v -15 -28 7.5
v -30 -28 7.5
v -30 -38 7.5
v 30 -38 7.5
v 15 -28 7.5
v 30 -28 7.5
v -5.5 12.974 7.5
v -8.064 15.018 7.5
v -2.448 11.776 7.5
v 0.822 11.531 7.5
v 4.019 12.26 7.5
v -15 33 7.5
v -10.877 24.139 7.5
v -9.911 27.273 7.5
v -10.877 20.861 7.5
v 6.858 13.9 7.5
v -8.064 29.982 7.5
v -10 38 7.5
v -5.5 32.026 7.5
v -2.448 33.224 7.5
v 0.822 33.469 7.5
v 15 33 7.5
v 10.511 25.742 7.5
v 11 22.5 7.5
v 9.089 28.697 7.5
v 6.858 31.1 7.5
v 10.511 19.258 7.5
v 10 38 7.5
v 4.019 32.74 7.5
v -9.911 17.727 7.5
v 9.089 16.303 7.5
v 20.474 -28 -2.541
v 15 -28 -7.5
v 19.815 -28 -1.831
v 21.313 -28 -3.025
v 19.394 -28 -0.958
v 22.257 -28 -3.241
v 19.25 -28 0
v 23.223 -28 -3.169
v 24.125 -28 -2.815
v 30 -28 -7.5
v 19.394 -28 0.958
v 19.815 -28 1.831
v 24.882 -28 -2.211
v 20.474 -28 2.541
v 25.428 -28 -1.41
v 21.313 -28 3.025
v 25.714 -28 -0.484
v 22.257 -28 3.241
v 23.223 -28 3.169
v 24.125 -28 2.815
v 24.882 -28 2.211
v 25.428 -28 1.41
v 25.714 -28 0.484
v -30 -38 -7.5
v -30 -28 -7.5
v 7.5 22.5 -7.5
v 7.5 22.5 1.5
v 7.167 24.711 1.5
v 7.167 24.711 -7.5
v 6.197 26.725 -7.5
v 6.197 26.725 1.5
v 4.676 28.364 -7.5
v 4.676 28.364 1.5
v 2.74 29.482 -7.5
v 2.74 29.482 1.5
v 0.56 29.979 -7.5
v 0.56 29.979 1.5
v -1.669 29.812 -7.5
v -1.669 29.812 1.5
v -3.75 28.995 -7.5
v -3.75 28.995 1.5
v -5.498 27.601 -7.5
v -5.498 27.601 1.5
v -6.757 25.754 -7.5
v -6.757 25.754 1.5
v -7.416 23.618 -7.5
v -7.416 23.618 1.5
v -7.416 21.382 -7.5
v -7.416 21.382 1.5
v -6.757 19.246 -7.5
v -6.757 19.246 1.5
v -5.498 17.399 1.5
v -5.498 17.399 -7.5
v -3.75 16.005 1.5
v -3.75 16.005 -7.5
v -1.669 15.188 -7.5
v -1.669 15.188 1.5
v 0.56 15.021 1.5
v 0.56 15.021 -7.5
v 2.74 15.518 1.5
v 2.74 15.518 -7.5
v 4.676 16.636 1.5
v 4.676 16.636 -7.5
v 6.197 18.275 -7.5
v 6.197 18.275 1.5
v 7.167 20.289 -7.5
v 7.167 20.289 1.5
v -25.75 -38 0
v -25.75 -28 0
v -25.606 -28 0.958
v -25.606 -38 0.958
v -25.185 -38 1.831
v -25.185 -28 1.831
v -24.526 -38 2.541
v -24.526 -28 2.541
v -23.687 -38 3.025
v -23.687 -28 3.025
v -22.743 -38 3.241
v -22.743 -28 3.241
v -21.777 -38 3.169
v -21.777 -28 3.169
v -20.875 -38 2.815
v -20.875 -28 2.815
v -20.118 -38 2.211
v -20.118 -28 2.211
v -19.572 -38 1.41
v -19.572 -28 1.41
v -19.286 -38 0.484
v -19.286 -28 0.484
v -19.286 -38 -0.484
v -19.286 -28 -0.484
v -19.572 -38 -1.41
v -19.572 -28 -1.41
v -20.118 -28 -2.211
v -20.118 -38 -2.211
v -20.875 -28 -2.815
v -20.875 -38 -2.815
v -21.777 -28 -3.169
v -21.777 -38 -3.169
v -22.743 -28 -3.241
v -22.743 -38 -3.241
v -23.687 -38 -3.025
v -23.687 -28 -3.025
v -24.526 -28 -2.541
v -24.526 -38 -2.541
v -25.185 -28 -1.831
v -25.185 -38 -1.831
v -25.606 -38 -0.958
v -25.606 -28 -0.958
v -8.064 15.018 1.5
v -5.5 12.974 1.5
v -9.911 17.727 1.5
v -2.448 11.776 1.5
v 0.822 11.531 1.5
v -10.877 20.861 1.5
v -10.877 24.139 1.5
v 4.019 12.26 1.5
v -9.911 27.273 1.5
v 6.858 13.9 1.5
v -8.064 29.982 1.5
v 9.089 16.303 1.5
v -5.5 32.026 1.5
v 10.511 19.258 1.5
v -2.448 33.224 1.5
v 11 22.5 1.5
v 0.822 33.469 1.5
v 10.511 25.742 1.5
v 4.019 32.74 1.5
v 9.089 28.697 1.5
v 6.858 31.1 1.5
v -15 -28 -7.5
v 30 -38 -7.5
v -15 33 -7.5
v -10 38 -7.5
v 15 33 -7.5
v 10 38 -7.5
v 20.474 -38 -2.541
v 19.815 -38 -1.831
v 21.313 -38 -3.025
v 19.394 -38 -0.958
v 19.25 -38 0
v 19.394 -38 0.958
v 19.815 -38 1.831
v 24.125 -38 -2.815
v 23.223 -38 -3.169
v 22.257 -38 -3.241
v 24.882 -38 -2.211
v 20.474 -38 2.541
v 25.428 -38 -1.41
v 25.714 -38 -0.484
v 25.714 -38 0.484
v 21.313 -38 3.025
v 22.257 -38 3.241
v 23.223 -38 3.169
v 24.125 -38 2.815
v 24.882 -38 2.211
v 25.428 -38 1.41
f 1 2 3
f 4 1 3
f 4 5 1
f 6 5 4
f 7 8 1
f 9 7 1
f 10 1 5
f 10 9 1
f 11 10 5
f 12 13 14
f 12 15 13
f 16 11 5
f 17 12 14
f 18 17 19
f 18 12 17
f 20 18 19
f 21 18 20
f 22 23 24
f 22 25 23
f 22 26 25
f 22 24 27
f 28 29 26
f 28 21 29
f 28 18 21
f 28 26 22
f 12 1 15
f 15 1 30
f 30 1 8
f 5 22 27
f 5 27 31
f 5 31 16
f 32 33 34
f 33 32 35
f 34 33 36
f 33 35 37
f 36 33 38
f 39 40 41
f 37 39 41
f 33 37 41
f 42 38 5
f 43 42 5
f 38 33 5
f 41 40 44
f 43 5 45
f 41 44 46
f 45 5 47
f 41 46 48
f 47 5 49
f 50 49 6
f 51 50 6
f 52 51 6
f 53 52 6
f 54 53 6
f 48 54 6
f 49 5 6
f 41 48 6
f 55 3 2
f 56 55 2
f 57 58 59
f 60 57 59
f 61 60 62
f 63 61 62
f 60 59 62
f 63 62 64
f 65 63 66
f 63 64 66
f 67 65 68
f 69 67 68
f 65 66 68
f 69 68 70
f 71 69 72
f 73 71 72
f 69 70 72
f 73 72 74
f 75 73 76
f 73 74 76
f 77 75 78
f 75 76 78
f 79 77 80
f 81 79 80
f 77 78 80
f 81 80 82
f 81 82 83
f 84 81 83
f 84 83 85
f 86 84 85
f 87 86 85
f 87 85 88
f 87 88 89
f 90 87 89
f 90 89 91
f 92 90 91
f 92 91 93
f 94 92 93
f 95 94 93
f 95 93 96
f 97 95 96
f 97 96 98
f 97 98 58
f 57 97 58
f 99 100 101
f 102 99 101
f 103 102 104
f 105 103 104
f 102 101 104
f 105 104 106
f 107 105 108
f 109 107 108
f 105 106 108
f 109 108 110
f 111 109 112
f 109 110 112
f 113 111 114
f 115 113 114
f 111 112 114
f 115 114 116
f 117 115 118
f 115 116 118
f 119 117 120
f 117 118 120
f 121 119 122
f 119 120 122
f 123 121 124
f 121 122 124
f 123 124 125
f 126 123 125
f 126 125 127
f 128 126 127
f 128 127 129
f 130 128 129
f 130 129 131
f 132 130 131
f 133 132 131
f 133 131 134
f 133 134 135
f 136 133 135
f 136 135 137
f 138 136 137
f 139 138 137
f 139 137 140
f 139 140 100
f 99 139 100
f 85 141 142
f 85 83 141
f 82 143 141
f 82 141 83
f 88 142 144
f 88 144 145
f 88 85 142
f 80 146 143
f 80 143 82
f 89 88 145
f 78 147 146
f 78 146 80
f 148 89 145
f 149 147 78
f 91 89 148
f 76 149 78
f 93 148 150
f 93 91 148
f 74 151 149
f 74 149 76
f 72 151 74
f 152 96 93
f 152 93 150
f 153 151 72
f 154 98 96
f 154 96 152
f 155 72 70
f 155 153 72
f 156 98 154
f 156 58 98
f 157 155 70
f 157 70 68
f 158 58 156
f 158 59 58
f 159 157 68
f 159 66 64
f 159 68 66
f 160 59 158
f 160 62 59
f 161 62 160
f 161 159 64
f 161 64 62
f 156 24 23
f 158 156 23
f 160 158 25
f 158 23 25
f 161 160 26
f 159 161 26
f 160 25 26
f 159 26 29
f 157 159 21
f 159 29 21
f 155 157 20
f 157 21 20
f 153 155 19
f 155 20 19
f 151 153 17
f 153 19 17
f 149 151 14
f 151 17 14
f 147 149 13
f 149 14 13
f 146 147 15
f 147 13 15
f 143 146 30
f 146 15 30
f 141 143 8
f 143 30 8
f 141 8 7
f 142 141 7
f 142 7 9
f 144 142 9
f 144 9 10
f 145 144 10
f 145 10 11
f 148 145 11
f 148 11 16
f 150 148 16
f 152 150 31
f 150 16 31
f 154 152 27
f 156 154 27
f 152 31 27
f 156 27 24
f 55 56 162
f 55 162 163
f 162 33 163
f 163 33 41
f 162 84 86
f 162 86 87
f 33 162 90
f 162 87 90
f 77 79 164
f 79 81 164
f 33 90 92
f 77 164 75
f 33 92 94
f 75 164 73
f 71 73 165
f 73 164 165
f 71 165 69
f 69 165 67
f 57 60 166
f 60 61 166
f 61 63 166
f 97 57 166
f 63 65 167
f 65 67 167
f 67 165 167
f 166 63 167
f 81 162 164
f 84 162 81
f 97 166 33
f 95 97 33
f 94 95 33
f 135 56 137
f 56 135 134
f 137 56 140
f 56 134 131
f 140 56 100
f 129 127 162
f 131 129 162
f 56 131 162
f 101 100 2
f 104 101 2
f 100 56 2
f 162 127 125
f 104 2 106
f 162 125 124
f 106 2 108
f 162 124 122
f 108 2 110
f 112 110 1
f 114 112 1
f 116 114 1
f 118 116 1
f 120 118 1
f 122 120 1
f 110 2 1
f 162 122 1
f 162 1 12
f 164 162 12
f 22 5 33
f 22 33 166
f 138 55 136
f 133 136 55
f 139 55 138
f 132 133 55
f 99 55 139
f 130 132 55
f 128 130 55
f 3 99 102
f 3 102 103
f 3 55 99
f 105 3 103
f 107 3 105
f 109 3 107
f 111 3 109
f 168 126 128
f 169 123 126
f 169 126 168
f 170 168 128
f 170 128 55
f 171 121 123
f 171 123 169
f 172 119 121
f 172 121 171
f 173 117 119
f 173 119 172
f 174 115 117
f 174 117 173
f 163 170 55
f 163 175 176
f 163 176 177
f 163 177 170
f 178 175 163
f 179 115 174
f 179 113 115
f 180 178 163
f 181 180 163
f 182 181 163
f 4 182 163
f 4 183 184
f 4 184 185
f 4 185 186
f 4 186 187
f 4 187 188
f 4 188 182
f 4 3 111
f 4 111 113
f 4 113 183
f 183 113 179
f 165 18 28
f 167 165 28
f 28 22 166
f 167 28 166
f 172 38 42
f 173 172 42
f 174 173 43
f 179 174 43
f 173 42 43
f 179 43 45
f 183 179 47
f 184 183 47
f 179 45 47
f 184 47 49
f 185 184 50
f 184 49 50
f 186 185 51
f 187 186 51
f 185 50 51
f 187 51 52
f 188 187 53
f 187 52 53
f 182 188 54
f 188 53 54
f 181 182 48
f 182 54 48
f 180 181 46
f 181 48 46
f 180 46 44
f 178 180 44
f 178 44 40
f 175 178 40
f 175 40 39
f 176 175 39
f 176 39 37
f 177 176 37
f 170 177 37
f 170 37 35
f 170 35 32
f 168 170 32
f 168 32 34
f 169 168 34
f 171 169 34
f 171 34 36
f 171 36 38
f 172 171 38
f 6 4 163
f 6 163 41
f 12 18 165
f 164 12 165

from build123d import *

# Parameters (mm, degrees)
SKETCH_1_W                  = 60
SKETCH_1_H                  = 76
EXTRUDE_1_DEPTH             = 7.5
SKETCH_2_W                  = 15
SKETCH_2_H                  = 66
CUT_EXTRUDE_2_DEPTH         = 51.68530359
CHAMFER_1_SIZE              = 5
HOLE_WIZARD_6_5_6_5_1_D     = 6.5
HOLE_WIZARD_6_5_6_5_1_DEPTH = 15
HOLE_WIZARD_6_5_6_5_1_TIP   = 1.952797012
SKETCH_6_R                  = 7.5
CUT_EXTRUDE_4_DEPTH         = 51.68530359
SKETCH_7_R                  = 11
CUT_EXTRUDE_5_DEPTH         = 6


with BuildPart() as part:
    # 草图1 → 拉伸1 (new, symmetric)
    with BuildSketch(Plane.XY):
        Rectangle(SKETCH_1_W, SKETCH_1_H)
    extrude(amount=EXTRUDE_1_DEPTH, both=True)

    # 草图2 → 拉伸2 (cut, through all)
    with BuildSketch(Plane.XY.offset(7.5)):
        with Locations((-22.5, 5)):
            Rectangle(SKETCH_2_W, SKETCH_2_H)
        with Locations((22.5, 5)):
            Rectangle(SKETCH_2_W, SKETCH_2_H)
    extrude(amount=-CUT_EXTRUDE_2_DEPTH, mode=Mode.SUBTRACT)

    # 倒角1
    chamfer_1_edges = [part.edges().sort_by_distance(p)[0] for p in [
        (-15, 38, 0),
        (15, 38, 0),
    ]]
    chamfer(chamfer_1_edges, length=CHAMFER_1_SIZE)

    # Ø6.5 (6.5) 直径孔1
    with Locations(Plane.XZ.offset(38)):
        with Locations((-22.5, 0), (22.5, 0)):
            Hole(HOLE_WIZARD_6_5_6_5_1_D / 2, depth=HOLE_WIZARD_6_5_6_5_1_DEPTH)
            with Locations((0, 0, -(HOLE_WIZARD_6_5_6_5_1_DEPTH + HOLE_WIZARD_6_5_6_5_1_TIP / 2))):  # 118° drill point
                Cone(0, HOLE_WIZARD_6_5_6_5_1_D / 2, HOLE_WIZARD_6_5_6_5_1_TIP, mode=Mode.SUBTRACT)

    # 草图6 → 拉伸4 (cut, through all)
    with BuildSketch(Plane.XY.offset(7.5)):
        with Locations((0, 22.5)):
            Circle(SKETCH_6_R)
    extrude(amount=-CUT_EXTRUDE_4_DEPTH, mode=Mode.SUBTRACT)

    # 草图7 → 拉伸5 (cut)
    with BuildSketch(Plane.XY.offset(7.5)):
        with Locations((0, 22.5)):
            Circle(SKETCH_7_R)
    extrude(amount=-CUT_EXTRUDE_5_DEPTH, mode=Mode.SUBTRACT)


solid = part.part
